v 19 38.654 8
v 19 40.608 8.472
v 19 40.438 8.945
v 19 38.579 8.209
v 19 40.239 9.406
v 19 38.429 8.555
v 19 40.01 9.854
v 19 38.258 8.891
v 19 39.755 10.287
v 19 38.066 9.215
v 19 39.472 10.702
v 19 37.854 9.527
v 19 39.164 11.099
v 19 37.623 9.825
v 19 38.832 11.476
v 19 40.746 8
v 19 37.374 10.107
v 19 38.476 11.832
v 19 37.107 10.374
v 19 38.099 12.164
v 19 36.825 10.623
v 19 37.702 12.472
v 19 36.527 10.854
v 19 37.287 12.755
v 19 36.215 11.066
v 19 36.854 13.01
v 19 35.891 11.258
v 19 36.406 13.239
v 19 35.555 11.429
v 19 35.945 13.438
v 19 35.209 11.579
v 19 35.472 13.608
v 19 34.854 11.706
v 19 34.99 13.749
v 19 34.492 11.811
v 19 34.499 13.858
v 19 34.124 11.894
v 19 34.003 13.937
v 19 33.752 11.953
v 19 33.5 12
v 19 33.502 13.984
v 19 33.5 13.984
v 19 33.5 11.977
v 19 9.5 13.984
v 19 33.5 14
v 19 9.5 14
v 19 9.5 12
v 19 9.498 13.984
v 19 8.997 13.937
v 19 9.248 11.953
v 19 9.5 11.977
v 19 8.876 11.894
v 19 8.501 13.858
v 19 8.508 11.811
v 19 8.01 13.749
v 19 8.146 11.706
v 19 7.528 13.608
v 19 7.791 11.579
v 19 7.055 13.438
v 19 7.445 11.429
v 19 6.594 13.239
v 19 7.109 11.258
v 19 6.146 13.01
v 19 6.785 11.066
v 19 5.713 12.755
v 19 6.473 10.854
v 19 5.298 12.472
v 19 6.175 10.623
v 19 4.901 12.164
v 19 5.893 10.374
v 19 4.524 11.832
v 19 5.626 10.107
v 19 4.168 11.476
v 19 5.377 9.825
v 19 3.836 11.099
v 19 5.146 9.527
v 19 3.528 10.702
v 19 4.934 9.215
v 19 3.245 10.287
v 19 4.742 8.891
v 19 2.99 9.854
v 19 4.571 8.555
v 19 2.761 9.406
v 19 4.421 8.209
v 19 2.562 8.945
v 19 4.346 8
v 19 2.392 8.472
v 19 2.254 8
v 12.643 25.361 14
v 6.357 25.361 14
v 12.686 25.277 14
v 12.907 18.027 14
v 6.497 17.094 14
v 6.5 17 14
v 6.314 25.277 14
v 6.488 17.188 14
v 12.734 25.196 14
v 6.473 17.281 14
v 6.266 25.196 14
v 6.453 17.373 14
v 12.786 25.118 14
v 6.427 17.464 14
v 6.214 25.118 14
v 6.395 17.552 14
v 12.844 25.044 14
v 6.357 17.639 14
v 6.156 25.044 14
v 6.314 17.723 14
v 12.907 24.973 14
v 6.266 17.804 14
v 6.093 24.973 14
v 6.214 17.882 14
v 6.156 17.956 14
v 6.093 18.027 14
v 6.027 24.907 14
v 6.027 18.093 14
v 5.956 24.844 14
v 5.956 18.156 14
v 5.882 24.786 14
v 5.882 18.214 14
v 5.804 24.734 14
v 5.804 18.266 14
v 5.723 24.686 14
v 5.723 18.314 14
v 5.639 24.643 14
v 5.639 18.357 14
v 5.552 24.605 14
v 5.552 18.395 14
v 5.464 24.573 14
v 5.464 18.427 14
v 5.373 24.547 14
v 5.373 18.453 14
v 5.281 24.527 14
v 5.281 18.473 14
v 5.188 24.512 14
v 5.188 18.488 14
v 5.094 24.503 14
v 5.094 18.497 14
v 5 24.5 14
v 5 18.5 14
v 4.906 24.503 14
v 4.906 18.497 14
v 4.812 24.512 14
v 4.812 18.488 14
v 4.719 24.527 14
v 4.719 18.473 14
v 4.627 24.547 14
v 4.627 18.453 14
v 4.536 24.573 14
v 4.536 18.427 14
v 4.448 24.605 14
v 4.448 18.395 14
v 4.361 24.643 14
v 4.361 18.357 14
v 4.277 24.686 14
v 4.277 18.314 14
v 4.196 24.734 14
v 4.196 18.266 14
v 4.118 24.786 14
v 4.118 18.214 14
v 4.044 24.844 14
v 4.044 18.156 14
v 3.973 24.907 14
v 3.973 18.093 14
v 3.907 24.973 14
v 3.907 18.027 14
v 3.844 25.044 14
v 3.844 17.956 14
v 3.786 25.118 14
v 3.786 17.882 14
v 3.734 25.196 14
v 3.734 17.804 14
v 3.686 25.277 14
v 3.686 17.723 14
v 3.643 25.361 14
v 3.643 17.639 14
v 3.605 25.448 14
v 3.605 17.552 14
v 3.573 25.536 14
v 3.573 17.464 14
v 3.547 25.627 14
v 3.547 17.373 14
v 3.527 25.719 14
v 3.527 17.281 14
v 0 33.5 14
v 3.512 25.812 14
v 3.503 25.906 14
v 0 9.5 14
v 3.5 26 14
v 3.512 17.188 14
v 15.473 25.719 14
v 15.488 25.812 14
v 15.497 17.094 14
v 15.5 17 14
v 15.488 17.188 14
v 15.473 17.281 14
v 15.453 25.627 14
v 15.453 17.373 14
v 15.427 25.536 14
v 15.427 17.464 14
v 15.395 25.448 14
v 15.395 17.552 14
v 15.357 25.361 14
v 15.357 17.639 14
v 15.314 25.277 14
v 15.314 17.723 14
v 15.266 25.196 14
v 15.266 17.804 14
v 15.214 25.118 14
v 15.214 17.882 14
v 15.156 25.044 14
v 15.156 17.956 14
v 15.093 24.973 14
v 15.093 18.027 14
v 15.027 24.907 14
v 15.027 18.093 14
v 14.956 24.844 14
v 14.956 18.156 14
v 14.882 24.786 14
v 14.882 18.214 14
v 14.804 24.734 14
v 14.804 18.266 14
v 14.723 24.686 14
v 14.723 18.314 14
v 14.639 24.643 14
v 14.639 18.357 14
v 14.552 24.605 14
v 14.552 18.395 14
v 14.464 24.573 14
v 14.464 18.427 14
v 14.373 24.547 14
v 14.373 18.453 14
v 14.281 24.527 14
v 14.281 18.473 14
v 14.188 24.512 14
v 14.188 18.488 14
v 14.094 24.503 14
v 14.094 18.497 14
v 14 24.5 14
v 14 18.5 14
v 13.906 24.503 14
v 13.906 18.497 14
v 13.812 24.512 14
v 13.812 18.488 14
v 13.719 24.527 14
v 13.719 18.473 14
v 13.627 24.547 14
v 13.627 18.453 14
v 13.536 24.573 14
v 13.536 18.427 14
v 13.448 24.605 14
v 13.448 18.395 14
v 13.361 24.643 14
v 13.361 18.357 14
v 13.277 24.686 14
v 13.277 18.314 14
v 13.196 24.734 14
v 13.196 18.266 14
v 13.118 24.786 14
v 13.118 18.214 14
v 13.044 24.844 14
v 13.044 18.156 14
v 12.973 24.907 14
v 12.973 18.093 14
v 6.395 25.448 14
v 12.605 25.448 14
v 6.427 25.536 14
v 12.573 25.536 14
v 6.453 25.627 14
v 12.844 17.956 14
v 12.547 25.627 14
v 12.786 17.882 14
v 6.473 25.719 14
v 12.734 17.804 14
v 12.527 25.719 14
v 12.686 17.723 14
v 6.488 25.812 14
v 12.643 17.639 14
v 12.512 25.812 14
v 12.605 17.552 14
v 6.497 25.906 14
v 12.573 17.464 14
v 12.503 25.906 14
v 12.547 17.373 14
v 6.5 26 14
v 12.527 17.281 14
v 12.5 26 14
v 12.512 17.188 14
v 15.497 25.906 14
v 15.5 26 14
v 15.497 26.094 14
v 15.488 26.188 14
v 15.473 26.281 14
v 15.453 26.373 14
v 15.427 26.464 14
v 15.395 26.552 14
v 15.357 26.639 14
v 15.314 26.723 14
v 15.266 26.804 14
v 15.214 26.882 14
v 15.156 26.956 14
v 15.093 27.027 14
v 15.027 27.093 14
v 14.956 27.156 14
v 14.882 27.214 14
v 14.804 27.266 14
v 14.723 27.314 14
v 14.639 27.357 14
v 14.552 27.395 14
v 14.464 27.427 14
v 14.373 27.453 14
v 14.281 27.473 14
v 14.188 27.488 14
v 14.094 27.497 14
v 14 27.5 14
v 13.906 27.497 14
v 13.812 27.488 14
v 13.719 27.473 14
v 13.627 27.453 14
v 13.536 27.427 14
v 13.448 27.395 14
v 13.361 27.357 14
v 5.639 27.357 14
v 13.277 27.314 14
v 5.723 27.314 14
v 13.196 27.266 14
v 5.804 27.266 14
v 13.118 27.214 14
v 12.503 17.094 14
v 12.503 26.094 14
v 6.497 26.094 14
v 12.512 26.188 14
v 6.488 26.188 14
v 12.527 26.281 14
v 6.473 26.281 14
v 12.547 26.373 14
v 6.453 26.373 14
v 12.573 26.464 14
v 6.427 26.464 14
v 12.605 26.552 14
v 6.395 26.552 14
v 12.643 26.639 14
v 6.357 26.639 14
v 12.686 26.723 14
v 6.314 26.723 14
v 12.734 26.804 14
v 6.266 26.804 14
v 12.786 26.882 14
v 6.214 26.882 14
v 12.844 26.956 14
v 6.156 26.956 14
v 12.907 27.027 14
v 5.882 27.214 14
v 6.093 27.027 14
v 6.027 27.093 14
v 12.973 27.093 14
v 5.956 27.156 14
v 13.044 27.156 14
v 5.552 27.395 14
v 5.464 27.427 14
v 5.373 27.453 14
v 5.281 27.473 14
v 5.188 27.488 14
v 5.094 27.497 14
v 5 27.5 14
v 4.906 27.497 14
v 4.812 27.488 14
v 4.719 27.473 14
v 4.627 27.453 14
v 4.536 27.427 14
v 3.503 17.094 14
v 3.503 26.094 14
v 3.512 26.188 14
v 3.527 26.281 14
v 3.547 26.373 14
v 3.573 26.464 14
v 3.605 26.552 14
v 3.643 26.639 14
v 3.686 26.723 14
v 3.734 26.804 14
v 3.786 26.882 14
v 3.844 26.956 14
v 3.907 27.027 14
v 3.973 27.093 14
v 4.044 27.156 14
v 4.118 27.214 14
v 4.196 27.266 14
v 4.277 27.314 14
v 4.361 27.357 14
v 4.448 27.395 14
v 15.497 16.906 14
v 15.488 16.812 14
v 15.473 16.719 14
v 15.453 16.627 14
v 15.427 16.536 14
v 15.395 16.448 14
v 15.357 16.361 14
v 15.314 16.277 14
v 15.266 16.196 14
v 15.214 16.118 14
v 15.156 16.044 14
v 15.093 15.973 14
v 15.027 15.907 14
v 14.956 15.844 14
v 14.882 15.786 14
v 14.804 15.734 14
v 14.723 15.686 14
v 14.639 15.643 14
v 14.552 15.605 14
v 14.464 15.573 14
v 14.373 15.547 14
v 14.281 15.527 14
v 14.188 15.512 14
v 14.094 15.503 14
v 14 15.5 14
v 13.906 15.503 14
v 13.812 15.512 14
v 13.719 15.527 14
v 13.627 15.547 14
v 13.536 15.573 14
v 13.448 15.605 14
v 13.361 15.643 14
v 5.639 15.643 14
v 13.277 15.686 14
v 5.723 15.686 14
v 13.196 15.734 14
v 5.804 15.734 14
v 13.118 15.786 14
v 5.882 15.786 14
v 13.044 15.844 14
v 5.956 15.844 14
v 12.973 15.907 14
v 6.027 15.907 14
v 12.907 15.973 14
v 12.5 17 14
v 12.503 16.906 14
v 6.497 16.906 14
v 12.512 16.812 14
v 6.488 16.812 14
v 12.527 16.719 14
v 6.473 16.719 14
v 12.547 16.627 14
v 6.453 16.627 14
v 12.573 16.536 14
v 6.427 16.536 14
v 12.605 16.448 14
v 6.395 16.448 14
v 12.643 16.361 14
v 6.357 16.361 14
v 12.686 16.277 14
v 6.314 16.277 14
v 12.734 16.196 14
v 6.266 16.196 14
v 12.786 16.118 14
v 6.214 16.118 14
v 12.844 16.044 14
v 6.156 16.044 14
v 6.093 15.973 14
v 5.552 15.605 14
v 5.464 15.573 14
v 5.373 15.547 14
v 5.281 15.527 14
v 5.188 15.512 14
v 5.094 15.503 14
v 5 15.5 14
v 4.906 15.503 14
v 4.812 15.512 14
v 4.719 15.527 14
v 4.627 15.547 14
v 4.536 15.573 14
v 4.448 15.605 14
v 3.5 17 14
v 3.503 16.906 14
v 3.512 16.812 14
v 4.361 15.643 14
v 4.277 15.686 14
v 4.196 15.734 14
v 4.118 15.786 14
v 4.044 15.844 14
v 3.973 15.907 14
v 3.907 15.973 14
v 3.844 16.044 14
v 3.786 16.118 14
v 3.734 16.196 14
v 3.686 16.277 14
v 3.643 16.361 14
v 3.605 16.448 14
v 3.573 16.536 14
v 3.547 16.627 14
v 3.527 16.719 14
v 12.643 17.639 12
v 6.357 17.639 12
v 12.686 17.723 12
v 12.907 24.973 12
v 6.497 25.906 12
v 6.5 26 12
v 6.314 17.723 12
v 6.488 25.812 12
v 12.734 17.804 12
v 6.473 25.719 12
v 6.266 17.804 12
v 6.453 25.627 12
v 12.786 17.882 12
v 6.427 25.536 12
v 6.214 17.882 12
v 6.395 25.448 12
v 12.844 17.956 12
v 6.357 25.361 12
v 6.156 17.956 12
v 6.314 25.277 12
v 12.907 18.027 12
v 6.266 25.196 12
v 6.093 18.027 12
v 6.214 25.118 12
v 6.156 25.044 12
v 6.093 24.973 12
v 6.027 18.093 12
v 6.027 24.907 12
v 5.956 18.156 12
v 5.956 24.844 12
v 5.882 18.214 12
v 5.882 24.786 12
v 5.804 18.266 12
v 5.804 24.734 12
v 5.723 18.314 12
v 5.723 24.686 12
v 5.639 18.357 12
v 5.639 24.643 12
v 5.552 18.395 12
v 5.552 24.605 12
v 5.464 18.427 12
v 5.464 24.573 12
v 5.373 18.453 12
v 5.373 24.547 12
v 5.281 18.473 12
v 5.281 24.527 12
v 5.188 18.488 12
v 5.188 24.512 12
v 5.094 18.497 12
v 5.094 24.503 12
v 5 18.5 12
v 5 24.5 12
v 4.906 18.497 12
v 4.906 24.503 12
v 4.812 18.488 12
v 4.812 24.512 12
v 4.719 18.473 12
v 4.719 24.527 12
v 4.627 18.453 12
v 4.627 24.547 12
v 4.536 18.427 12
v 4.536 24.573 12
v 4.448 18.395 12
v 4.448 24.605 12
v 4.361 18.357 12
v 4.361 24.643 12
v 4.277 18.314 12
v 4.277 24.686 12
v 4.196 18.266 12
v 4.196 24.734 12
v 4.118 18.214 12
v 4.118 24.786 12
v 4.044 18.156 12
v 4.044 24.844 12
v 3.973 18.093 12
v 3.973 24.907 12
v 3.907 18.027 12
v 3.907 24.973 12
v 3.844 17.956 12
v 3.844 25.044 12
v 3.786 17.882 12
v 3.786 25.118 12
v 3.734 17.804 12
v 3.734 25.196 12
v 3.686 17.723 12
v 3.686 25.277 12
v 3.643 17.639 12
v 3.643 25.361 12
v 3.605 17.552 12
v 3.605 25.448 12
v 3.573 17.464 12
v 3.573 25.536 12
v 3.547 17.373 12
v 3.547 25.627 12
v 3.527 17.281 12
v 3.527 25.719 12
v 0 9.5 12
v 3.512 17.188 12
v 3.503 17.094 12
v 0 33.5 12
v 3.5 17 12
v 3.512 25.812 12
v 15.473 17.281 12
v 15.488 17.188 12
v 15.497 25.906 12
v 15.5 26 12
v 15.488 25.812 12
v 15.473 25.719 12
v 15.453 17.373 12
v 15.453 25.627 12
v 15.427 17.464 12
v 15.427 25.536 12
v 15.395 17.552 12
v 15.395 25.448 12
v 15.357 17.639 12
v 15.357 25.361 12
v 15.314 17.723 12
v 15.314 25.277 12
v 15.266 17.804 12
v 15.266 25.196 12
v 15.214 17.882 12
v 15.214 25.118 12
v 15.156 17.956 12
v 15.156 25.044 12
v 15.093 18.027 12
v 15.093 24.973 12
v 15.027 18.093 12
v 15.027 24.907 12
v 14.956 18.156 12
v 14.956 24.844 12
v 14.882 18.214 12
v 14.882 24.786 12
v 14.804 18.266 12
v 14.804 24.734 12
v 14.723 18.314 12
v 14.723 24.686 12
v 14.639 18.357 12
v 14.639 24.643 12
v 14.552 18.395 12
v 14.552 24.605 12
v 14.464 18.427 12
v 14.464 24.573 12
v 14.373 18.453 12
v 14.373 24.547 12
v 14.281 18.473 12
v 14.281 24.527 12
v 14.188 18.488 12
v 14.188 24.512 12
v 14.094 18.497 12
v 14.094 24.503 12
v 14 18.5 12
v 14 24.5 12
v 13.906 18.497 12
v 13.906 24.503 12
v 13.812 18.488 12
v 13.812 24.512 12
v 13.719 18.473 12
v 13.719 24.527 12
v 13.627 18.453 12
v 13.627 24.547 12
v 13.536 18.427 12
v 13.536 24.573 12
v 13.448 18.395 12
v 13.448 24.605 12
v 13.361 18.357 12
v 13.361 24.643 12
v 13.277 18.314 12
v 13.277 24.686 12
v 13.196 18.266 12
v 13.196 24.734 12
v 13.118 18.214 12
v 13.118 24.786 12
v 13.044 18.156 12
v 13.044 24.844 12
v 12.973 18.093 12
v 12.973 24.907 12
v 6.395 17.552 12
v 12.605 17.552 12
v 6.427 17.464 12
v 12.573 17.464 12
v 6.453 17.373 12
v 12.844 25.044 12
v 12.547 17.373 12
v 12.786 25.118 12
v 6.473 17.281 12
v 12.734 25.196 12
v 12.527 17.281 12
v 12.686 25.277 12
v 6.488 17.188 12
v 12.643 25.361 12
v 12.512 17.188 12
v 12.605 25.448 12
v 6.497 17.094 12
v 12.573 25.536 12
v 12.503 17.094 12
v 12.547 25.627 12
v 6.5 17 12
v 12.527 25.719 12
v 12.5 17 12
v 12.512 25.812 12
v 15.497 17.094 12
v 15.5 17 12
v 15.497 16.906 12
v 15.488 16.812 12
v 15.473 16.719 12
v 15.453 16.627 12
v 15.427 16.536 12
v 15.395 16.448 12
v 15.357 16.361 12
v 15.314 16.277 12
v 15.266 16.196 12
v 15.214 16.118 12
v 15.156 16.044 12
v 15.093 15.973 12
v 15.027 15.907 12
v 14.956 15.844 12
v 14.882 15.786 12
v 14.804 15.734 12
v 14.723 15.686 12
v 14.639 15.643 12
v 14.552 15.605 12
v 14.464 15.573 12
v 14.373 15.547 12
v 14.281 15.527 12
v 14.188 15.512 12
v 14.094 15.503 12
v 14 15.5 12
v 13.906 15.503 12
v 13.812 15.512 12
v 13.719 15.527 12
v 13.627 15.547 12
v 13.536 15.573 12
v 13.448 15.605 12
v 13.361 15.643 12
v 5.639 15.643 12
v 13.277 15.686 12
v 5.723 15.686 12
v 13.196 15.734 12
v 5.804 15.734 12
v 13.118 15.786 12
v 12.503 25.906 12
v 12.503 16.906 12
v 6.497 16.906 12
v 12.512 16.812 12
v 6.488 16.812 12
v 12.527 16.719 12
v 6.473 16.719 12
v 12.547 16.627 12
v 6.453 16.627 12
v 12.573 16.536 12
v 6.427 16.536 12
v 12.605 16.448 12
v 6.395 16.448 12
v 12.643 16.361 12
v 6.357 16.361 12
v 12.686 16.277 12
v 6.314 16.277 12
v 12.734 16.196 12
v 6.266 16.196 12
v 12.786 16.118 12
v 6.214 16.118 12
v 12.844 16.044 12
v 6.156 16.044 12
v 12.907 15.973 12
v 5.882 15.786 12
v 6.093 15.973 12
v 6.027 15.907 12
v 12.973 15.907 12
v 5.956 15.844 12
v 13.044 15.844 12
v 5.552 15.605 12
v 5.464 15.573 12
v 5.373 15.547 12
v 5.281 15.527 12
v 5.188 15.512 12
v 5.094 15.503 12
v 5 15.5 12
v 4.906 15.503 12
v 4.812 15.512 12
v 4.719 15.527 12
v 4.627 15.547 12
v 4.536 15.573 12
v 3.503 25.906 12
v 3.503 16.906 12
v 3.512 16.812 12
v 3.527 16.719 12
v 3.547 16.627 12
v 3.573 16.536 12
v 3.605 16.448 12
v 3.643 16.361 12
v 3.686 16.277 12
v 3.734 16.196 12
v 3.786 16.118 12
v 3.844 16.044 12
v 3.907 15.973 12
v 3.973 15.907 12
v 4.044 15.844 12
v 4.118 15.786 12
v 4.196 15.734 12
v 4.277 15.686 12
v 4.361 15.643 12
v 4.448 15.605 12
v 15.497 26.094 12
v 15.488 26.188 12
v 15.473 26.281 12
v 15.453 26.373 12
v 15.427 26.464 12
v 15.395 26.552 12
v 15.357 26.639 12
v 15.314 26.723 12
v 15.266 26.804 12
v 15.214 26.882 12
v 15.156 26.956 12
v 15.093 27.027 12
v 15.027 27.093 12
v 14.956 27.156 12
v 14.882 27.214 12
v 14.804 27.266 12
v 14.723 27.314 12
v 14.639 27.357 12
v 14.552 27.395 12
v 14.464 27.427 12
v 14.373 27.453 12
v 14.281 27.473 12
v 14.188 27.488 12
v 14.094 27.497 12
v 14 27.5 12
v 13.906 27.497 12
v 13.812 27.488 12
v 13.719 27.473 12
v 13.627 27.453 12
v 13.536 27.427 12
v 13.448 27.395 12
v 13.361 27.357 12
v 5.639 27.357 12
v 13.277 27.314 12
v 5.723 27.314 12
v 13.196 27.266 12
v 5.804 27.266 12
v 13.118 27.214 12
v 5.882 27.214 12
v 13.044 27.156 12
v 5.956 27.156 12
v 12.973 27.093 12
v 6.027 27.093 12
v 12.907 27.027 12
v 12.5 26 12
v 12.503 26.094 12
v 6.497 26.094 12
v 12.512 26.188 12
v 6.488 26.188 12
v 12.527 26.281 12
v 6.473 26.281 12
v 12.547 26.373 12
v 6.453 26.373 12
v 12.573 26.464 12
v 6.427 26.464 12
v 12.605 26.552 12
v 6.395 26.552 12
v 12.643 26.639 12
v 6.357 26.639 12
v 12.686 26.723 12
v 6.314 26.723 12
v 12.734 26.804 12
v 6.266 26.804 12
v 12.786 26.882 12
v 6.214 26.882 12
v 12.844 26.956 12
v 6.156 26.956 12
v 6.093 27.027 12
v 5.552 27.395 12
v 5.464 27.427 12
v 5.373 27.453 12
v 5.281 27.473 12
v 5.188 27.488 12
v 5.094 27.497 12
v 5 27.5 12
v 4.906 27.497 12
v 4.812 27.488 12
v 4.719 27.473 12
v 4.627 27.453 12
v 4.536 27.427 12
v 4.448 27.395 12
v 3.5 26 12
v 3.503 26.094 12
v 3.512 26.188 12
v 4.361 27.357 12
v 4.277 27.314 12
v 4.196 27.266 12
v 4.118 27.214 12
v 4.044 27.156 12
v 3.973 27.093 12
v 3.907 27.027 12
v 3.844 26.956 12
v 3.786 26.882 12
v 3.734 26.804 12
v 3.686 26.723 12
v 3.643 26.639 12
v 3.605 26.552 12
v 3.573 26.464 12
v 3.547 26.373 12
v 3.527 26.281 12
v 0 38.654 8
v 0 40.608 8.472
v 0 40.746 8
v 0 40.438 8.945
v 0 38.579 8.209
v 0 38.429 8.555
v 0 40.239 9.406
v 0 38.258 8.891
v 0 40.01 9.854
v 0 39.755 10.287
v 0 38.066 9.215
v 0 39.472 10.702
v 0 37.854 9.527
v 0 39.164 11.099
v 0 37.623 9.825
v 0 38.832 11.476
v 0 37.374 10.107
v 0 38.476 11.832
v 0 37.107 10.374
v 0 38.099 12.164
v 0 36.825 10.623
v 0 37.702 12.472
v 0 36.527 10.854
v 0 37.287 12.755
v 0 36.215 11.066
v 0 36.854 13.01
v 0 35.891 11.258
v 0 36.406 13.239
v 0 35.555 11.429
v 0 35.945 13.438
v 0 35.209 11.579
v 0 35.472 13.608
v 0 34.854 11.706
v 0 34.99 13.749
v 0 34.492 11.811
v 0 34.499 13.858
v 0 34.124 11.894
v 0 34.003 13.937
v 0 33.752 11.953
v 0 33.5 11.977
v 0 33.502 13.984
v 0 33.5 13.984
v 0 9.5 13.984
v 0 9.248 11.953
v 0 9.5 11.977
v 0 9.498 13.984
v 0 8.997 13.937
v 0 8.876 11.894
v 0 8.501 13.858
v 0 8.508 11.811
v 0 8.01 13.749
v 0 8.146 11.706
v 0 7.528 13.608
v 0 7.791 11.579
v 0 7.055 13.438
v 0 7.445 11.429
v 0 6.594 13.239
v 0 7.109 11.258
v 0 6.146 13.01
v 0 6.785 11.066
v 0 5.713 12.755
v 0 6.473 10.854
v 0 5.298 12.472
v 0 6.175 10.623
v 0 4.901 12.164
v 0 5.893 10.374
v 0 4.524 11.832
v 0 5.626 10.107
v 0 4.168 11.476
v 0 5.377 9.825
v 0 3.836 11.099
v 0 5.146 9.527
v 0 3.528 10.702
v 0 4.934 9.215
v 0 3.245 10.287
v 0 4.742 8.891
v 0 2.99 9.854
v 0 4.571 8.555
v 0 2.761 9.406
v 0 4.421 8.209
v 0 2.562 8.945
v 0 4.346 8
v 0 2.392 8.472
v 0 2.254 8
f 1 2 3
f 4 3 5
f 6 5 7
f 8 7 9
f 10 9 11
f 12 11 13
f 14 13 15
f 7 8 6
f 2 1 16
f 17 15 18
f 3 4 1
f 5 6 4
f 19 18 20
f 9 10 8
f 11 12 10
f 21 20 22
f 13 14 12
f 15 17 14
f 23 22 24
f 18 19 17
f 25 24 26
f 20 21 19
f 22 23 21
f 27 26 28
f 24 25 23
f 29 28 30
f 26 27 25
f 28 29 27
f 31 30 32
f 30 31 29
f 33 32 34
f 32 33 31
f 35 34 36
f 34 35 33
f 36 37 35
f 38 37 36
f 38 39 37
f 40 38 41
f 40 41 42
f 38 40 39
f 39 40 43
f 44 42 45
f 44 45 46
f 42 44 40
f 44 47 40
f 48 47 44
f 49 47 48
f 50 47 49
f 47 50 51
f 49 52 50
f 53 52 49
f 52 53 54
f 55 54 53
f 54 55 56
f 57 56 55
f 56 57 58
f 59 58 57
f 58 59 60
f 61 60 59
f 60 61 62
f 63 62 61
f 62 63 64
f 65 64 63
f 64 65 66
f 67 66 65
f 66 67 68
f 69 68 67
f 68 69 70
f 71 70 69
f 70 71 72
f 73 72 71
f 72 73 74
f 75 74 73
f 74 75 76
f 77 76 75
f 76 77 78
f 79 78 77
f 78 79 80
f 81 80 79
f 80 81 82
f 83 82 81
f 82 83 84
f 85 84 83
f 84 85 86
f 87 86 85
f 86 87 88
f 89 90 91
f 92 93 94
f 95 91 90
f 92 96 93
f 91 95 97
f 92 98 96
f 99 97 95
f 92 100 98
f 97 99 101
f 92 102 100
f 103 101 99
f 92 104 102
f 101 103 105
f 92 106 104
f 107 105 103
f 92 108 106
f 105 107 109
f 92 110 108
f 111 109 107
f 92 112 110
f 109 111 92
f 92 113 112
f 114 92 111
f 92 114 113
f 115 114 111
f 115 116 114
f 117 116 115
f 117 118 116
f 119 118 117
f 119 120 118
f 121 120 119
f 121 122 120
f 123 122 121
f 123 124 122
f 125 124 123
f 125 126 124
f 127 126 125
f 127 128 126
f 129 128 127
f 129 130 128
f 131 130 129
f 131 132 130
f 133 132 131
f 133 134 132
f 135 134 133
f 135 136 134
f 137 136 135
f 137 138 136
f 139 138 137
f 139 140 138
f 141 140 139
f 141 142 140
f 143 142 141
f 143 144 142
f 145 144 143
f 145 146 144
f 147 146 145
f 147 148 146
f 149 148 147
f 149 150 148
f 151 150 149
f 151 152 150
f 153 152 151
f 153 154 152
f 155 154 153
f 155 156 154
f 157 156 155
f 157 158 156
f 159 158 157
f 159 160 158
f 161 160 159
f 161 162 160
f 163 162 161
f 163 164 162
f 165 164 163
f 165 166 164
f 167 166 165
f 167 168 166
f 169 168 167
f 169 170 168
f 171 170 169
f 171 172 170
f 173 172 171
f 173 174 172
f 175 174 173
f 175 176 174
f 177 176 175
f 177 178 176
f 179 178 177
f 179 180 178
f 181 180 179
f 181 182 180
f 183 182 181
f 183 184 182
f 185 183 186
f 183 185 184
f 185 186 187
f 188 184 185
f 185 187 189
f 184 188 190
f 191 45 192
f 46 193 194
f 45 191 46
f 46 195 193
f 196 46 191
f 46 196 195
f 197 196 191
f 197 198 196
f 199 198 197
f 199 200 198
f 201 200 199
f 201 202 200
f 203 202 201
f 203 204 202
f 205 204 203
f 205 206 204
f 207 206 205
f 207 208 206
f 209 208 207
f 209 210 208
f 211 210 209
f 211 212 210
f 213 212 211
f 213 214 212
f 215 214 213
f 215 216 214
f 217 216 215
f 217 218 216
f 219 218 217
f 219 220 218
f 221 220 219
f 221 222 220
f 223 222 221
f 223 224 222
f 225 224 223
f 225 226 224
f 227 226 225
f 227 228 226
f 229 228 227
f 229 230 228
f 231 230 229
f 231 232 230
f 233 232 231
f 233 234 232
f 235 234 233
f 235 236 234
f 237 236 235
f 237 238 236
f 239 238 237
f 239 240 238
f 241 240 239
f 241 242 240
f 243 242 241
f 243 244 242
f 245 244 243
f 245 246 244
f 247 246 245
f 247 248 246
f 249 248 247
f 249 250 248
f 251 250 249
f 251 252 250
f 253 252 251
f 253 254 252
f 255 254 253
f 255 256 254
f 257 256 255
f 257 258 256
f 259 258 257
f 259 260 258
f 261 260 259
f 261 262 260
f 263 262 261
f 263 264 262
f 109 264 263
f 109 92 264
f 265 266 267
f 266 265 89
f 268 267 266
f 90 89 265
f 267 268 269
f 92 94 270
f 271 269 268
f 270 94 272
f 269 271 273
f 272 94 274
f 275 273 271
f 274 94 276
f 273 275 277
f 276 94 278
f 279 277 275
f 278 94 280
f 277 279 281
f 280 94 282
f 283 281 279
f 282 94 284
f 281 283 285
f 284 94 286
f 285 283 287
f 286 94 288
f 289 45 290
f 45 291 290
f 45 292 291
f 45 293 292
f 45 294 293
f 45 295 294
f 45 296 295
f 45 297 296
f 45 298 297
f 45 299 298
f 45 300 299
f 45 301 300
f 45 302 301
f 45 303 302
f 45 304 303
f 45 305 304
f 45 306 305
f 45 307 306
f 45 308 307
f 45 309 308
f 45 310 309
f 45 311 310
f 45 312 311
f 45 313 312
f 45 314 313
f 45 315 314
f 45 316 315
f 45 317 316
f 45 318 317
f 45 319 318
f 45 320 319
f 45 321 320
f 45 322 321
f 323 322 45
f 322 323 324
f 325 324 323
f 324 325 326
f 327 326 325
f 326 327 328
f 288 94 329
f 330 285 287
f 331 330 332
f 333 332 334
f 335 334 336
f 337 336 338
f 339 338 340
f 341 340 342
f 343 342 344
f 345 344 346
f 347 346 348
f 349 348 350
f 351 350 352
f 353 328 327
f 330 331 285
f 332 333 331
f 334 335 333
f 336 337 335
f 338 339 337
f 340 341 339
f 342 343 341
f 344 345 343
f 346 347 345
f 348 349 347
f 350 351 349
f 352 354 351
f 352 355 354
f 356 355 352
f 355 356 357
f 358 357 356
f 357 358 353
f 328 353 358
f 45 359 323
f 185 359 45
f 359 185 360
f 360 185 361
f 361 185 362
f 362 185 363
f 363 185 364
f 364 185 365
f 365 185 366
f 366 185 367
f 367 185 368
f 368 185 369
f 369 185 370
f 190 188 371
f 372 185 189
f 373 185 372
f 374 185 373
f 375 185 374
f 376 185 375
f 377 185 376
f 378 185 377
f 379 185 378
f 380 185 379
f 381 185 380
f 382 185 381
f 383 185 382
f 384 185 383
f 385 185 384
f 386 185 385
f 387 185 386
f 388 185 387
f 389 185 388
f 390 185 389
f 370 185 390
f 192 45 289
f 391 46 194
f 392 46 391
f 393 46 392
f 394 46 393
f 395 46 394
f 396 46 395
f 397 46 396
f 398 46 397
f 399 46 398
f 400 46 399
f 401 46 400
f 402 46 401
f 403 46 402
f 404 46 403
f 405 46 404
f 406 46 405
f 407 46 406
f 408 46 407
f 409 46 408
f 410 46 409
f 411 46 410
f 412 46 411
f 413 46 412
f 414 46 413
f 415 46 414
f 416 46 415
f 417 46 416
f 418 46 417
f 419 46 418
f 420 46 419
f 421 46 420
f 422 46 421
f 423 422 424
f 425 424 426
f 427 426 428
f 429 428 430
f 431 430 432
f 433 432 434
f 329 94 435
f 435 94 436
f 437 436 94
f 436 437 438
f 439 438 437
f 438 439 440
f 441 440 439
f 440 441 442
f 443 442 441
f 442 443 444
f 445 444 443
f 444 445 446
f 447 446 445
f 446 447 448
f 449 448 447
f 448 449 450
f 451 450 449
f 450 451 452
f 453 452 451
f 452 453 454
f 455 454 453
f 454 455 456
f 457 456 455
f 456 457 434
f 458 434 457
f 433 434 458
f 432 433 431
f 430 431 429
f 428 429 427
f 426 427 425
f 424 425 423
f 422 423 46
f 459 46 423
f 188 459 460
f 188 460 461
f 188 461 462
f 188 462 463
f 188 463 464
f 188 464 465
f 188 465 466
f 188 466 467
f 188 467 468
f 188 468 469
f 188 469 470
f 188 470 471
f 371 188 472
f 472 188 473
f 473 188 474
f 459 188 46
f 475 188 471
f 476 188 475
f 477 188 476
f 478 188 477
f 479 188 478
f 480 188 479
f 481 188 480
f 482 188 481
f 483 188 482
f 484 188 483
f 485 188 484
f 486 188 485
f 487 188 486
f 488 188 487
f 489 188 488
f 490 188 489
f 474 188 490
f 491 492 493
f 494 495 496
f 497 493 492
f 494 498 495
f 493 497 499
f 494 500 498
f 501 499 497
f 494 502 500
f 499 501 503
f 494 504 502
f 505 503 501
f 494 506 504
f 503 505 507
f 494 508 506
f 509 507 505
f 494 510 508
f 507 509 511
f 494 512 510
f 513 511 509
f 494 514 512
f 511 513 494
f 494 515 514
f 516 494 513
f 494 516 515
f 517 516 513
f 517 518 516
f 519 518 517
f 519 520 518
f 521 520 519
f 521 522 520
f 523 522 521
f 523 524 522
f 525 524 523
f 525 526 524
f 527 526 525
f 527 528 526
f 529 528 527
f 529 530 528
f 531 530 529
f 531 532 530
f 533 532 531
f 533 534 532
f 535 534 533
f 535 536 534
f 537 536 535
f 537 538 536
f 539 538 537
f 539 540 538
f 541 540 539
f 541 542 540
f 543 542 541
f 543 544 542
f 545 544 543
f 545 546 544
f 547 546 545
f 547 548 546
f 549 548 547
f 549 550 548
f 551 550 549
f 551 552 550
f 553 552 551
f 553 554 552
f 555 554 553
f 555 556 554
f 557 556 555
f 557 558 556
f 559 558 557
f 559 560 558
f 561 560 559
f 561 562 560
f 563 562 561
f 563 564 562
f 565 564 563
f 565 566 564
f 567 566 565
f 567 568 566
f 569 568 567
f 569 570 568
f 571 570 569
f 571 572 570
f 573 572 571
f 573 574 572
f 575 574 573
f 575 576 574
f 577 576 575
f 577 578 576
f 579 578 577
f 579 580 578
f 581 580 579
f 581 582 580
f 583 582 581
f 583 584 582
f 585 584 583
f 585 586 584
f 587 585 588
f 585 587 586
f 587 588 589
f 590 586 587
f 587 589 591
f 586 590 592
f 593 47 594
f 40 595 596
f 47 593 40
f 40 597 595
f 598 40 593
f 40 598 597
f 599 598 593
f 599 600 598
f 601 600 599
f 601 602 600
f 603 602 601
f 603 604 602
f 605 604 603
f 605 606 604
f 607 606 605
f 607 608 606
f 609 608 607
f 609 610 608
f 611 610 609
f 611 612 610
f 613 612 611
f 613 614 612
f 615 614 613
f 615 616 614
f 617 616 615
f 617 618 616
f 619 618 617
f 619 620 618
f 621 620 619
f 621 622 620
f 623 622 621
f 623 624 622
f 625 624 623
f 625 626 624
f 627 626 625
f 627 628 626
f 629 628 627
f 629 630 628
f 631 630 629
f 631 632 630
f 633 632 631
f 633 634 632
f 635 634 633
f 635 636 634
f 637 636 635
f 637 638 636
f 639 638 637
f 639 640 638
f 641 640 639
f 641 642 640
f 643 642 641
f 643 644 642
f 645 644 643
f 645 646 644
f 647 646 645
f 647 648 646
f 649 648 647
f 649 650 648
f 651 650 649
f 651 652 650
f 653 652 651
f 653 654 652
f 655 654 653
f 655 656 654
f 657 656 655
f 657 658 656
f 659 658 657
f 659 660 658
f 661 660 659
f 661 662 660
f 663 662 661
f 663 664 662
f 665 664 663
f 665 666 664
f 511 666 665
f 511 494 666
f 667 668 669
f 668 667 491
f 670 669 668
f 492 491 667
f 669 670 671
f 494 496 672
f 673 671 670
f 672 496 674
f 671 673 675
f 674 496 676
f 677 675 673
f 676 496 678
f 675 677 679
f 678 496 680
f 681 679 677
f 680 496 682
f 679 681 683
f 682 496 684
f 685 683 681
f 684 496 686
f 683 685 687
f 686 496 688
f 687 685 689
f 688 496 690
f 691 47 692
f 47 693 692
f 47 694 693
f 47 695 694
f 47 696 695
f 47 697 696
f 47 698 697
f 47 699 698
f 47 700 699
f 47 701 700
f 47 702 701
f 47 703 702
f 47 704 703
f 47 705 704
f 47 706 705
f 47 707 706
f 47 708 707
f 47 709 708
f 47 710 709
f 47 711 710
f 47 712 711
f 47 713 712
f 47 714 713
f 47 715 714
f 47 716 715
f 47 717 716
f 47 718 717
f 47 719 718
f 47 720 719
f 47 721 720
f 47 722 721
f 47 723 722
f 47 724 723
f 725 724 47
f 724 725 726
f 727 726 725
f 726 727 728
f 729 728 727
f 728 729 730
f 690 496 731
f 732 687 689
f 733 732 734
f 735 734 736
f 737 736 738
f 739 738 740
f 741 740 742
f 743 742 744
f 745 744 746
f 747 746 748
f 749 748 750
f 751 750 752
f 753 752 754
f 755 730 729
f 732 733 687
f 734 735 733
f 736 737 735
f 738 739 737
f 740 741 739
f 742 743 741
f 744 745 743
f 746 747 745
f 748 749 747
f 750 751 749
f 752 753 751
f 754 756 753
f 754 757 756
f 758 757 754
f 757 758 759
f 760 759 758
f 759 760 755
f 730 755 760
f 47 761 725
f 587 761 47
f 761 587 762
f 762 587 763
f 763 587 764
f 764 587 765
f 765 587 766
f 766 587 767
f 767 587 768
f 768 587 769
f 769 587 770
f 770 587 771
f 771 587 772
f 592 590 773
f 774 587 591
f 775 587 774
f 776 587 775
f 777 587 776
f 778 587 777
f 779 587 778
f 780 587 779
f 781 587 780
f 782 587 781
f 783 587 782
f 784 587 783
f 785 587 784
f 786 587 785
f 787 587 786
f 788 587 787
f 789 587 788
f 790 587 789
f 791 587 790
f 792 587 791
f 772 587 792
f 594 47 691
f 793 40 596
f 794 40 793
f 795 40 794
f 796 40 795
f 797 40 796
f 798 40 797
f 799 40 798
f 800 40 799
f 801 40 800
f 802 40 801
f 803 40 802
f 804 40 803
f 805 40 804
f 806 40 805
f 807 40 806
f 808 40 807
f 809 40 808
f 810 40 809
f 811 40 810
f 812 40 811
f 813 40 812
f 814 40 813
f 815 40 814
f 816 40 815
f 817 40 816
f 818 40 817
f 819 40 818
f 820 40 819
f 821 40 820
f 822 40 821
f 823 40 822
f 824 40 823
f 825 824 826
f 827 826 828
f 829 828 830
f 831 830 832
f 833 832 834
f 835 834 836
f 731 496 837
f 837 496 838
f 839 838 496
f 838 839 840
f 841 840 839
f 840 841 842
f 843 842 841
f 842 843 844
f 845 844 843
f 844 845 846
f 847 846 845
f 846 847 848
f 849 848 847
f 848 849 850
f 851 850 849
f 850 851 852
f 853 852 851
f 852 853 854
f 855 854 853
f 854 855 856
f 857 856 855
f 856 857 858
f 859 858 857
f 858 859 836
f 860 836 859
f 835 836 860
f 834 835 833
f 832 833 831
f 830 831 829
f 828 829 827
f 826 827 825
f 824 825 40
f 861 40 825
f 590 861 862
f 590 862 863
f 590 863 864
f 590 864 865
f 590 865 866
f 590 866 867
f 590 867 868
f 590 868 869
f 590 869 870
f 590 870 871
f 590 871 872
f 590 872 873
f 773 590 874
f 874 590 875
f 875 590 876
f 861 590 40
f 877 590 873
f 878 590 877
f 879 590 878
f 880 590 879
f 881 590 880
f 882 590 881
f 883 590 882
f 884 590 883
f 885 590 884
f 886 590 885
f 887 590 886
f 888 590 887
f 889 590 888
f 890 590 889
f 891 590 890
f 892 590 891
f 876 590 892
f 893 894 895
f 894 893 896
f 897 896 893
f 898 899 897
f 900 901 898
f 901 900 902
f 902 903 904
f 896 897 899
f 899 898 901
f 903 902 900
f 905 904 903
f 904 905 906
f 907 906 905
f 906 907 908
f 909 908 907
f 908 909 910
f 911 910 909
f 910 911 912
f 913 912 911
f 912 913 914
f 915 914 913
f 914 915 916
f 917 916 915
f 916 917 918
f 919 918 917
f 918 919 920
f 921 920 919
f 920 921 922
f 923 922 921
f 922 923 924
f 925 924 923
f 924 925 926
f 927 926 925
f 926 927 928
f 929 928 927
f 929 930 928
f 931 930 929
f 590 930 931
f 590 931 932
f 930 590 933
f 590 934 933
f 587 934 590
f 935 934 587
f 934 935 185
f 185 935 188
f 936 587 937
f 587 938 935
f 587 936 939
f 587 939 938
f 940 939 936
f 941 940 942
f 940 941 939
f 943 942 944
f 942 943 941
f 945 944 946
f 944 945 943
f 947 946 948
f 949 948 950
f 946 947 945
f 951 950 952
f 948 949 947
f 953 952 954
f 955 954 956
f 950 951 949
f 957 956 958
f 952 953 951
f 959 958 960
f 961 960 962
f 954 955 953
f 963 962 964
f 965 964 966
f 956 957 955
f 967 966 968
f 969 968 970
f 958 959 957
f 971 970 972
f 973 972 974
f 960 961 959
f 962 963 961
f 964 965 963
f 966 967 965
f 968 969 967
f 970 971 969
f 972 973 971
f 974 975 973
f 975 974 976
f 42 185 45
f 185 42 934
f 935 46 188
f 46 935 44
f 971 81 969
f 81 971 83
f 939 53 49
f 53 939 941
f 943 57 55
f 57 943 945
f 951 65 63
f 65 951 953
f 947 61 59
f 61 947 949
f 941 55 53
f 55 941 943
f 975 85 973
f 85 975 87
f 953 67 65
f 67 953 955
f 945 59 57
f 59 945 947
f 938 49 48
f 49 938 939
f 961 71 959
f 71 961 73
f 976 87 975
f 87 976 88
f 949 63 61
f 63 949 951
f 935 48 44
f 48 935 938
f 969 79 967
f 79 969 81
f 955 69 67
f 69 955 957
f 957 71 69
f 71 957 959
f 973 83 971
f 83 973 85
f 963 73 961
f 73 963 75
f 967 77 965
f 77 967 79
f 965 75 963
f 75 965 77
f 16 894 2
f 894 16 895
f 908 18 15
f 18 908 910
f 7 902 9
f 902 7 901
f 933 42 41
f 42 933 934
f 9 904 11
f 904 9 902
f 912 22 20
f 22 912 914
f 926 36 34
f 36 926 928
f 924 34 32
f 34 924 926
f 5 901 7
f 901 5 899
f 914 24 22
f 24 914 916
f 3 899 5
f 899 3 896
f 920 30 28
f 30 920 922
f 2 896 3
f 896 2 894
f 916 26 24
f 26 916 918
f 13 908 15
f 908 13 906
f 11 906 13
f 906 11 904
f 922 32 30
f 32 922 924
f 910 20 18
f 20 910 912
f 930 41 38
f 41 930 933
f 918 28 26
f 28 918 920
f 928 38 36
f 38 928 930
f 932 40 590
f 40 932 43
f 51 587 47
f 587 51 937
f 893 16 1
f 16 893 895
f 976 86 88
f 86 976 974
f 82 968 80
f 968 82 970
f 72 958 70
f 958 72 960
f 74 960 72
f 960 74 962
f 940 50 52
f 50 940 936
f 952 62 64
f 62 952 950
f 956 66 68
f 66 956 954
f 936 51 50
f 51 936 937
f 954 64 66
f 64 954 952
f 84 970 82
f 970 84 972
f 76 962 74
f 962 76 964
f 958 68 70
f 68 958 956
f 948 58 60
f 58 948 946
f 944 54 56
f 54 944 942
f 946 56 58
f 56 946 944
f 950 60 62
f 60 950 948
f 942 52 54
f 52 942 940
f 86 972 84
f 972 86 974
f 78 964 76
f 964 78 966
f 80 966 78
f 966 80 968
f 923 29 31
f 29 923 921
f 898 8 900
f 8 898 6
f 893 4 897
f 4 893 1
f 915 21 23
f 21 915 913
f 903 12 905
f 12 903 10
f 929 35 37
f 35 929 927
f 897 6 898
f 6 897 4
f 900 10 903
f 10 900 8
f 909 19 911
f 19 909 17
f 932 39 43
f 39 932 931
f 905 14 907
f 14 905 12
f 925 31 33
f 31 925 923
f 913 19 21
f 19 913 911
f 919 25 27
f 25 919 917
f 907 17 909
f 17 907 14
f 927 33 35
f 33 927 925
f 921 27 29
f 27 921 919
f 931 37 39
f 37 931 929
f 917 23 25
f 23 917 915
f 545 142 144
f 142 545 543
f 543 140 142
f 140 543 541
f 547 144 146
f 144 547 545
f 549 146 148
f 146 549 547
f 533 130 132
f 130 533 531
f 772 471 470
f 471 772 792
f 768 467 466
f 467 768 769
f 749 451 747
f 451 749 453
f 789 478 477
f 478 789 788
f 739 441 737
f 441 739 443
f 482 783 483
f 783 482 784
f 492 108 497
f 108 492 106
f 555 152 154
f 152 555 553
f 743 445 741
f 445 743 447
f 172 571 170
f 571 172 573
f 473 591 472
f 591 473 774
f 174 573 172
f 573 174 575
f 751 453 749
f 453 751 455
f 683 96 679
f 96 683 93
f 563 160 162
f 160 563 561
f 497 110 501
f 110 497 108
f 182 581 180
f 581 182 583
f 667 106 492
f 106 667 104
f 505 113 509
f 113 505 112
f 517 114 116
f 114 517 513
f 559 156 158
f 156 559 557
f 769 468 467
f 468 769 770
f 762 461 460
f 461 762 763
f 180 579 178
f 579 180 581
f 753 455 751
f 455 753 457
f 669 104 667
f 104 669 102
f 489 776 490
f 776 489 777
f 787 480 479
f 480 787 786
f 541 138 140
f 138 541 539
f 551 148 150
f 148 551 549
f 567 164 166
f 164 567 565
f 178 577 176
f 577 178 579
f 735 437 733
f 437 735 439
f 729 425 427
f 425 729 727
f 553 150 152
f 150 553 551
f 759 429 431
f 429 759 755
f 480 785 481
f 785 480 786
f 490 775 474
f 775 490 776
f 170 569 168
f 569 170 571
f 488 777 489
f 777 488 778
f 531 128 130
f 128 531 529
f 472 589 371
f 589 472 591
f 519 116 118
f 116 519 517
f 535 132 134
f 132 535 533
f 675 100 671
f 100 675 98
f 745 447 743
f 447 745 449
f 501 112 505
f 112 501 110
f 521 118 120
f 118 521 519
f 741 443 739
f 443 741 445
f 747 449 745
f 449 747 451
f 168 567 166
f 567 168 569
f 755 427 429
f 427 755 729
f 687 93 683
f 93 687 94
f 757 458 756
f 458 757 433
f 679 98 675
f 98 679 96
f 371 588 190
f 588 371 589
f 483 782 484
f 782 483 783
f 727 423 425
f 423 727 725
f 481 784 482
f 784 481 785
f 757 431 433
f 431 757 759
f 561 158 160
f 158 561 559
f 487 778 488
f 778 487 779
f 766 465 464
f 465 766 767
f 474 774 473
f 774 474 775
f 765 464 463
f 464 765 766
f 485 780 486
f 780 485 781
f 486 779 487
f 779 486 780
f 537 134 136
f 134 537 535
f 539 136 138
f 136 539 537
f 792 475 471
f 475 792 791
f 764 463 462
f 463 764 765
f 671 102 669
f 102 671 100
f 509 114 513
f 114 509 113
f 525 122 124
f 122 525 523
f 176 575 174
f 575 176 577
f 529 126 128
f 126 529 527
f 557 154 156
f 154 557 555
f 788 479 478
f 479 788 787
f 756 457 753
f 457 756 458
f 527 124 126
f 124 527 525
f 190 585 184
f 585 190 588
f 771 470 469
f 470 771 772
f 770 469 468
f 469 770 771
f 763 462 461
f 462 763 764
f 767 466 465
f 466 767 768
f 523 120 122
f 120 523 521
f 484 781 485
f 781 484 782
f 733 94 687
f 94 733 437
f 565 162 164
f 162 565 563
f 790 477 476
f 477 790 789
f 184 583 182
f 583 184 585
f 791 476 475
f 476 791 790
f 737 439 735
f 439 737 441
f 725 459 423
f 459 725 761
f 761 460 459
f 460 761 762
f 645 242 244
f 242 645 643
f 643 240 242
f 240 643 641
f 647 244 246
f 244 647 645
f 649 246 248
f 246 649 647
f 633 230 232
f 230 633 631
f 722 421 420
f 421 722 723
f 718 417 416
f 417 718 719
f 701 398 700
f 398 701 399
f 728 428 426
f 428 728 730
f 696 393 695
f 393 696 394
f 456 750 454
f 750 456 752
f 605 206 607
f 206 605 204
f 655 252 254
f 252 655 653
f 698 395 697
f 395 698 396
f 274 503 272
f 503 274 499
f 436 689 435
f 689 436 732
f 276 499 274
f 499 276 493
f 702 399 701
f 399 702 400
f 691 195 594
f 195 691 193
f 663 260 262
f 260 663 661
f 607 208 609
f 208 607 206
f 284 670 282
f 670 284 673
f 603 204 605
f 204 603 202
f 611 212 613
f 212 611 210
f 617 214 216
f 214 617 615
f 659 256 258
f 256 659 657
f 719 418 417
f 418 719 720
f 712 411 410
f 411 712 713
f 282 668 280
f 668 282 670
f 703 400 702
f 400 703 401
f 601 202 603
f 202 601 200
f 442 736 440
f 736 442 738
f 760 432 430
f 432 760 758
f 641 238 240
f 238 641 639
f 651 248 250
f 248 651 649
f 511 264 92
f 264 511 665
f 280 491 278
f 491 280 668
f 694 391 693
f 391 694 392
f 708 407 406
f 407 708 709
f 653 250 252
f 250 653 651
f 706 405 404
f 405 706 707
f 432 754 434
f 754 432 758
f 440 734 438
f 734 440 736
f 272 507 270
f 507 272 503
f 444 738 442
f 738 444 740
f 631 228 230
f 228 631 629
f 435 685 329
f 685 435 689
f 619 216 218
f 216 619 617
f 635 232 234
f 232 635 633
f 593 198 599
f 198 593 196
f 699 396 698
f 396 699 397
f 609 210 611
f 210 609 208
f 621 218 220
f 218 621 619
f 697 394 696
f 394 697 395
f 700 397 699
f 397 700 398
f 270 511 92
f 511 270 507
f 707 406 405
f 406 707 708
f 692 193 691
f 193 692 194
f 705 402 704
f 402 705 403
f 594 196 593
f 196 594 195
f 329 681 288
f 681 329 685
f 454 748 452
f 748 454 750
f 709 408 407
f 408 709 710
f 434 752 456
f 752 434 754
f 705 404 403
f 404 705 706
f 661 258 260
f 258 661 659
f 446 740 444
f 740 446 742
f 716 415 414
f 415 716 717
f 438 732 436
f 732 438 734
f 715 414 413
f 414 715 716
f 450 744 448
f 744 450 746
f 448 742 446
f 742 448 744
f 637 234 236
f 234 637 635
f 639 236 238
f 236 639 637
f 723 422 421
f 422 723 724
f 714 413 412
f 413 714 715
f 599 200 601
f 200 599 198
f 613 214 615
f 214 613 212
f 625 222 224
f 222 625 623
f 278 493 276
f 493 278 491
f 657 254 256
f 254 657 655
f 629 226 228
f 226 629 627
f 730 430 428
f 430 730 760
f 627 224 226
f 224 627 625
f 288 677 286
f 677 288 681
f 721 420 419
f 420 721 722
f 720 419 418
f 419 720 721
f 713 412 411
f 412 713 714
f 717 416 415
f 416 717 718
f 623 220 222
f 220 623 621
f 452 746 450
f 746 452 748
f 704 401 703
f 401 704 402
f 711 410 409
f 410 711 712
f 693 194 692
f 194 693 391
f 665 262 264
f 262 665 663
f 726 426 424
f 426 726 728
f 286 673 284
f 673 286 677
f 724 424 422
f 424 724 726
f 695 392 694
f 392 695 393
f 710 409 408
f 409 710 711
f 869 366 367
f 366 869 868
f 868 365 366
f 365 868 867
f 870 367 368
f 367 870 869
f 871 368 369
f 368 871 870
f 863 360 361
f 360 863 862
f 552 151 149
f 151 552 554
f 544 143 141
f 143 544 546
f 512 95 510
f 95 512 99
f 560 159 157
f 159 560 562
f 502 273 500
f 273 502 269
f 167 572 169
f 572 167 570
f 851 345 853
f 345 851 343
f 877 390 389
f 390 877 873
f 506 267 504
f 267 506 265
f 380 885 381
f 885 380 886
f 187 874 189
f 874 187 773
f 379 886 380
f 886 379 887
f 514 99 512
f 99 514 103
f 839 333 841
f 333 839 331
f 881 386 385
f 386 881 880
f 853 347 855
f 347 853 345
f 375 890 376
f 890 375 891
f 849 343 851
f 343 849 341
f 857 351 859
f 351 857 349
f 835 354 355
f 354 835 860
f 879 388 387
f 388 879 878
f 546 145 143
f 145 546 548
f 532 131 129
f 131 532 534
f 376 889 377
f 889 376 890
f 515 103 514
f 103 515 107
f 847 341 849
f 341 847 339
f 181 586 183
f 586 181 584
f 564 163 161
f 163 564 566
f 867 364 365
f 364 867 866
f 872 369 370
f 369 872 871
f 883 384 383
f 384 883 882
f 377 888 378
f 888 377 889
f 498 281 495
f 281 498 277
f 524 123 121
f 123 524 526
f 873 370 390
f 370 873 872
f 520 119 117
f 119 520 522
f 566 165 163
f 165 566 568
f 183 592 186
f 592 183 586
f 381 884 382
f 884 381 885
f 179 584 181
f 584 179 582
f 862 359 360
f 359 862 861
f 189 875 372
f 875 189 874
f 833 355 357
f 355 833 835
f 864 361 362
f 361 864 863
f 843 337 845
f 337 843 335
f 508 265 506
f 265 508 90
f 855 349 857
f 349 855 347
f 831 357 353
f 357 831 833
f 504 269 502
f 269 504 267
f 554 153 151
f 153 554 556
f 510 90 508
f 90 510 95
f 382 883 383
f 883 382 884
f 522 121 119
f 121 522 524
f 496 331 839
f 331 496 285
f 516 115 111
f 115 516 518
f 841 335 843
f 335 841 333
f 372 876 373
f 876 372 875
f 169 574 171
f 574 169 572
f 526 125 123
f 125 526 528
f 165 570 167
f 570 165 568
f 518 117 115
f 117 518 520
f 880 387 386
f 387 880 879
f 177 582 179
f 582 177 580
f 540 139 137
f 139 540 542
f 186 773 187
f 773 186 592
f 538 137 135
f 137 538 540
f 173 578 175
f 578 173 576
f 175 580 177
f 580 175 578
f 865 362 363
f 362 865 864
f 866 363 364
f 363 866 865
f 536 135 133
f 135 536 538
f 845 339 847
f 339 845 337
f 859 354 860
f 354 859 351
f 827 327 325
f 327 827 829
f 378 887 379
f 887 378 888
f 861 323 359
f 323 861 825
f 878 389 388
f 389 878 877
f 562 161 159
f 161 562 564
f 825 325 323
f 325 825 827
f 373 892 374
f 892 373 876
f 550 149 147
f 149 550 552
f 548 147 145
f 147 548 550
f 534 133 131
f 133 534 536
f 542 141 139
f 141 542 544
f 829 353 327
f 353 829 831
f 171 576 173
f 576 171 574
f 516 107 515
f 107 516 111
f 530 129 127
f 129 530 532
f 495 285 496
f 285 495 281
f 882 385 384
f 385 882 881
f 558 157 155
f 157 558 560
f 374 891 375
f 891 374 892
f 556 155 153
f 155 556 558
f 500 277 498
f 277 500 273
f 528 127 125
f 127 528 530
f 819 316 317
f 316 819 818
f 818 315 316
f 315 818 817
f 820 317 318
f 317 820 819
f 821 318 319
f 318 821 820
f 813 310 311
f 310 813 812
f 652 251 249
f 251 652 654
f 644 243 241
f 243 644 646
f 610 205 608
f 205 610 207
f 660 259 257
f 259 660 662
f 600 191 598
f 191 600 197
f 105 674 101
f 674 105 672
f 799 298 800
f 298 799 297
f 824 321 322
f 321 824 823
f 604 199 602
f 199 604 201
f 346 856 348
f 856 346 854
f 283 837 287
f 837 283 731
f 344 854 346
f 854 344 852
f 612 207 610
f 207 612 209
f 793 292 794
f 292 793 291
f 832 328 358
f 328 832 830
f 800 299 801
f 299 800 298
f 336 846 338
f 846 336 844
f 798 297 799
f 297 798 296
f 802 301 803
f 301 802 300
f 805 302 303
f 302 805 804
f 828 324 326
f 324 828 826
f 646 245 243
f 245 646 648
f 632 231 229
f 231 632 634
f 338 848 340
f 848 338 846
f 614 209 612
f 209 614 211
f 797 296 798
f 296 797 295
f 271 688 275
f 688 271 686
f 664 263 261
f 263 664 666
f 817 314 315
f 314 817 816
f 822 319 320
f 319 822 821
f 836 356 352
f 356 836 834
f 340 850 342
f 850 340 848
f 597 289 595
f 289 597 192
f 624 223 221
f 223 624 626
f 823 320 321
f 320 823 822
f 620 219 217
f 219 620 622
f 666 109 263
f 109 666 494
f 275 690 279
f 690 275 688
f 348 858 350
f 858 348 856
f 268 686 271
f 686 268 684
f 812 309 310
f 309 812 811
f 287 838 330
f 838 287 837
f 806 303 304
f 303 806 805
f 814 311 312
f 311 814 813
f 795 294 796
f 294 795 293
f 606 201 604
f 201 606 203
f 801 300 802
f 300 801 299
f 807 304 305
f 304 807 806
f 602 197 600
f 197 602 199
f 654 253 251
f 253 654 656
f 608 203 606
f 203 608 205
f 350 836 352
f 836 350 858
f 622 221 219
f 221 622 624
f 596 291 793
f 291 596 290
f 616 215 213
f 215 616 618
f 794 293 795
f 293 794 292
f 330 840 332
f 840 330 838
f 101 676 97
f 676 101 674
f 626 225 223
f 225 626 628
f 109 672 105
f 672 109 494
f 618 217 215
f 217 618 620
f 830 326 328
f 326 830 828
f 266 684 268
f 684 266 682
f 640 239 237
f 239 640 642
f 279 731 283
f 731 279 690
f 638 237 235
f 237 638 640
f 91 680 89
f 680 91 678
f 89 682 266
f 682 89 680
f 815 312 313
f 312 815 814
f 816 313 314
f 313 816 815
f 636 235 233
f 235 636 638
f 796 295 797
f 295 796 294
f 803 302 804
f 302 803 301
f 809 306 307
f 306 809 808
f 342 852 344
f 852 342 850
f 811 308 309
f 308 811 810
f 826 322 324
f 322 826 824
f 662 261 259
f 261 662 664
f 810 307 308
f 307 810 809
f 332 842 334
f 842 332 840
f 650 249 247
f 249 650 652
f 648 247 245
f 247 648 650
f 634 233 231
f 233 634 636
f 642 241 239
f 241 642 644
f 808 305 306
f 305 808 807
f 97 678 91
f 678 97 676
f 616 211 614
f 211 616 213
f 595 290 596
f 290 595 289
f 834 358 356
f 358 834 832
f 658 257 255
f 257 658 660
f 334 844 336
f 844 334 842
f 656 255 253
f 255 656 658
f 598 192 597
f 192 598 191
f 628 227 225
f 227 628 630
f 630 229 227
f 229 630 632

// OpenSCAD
difference(){
	union(){ 

        translate([0,9.5,12]){
           cube([19,24,2], center=false);
        }                
        
        translate([9.5,10,6]){
            rotate([0,90,0]){
                cylinder(h=19, r=8, $fn=100, center=true);
            }   
        }
        translate([9.5,10+8+15,6]){
            rotate([0,90,0]){
                cylinder(h=19, r=8, $fn=100, center=true);
            }   
        }

	}
	union() {
        translate([-1,9.5,2]){
           cube([21,24,10], center=false);
        }                
        translate([-1,-1,-20+8]){
           cube([50,50,20], center=false);
        }                
        
        translate([9.5,10,6]){
            rotate([0,90,0]){
                cylinder(h=190, r=6, $fn=100, center=true);
            }   
        }
        translate([9.5,10+8+15,6]){
            rotate([0,90,0]){
                cylinder(h=190, r=6, $fn=100, center=true);
            }   
        }
        
        
        translate([5,17,0]){
            rotate([0,0,90]){
                cylinder(h=200, r=1.5, $fn=100, center=true);
            }   
        }
        translate([14,17,0]){
            rotate([0,0,90]){
                cylinder(h=200, r=1.5, $fn=100, center=true);
            }   
        }
        
        translate([5,26,0]){
            rotate([0,0,90]){
                cylinder(h=200, r=1.5, $fn=100, center=true);
            }   
        }
        translate([14,26,0]){
            rotate([0,0,90]){
                cylinder(h=200, r=1.5, $fn=100, center=true);
            }   
        }
        
	}
}
